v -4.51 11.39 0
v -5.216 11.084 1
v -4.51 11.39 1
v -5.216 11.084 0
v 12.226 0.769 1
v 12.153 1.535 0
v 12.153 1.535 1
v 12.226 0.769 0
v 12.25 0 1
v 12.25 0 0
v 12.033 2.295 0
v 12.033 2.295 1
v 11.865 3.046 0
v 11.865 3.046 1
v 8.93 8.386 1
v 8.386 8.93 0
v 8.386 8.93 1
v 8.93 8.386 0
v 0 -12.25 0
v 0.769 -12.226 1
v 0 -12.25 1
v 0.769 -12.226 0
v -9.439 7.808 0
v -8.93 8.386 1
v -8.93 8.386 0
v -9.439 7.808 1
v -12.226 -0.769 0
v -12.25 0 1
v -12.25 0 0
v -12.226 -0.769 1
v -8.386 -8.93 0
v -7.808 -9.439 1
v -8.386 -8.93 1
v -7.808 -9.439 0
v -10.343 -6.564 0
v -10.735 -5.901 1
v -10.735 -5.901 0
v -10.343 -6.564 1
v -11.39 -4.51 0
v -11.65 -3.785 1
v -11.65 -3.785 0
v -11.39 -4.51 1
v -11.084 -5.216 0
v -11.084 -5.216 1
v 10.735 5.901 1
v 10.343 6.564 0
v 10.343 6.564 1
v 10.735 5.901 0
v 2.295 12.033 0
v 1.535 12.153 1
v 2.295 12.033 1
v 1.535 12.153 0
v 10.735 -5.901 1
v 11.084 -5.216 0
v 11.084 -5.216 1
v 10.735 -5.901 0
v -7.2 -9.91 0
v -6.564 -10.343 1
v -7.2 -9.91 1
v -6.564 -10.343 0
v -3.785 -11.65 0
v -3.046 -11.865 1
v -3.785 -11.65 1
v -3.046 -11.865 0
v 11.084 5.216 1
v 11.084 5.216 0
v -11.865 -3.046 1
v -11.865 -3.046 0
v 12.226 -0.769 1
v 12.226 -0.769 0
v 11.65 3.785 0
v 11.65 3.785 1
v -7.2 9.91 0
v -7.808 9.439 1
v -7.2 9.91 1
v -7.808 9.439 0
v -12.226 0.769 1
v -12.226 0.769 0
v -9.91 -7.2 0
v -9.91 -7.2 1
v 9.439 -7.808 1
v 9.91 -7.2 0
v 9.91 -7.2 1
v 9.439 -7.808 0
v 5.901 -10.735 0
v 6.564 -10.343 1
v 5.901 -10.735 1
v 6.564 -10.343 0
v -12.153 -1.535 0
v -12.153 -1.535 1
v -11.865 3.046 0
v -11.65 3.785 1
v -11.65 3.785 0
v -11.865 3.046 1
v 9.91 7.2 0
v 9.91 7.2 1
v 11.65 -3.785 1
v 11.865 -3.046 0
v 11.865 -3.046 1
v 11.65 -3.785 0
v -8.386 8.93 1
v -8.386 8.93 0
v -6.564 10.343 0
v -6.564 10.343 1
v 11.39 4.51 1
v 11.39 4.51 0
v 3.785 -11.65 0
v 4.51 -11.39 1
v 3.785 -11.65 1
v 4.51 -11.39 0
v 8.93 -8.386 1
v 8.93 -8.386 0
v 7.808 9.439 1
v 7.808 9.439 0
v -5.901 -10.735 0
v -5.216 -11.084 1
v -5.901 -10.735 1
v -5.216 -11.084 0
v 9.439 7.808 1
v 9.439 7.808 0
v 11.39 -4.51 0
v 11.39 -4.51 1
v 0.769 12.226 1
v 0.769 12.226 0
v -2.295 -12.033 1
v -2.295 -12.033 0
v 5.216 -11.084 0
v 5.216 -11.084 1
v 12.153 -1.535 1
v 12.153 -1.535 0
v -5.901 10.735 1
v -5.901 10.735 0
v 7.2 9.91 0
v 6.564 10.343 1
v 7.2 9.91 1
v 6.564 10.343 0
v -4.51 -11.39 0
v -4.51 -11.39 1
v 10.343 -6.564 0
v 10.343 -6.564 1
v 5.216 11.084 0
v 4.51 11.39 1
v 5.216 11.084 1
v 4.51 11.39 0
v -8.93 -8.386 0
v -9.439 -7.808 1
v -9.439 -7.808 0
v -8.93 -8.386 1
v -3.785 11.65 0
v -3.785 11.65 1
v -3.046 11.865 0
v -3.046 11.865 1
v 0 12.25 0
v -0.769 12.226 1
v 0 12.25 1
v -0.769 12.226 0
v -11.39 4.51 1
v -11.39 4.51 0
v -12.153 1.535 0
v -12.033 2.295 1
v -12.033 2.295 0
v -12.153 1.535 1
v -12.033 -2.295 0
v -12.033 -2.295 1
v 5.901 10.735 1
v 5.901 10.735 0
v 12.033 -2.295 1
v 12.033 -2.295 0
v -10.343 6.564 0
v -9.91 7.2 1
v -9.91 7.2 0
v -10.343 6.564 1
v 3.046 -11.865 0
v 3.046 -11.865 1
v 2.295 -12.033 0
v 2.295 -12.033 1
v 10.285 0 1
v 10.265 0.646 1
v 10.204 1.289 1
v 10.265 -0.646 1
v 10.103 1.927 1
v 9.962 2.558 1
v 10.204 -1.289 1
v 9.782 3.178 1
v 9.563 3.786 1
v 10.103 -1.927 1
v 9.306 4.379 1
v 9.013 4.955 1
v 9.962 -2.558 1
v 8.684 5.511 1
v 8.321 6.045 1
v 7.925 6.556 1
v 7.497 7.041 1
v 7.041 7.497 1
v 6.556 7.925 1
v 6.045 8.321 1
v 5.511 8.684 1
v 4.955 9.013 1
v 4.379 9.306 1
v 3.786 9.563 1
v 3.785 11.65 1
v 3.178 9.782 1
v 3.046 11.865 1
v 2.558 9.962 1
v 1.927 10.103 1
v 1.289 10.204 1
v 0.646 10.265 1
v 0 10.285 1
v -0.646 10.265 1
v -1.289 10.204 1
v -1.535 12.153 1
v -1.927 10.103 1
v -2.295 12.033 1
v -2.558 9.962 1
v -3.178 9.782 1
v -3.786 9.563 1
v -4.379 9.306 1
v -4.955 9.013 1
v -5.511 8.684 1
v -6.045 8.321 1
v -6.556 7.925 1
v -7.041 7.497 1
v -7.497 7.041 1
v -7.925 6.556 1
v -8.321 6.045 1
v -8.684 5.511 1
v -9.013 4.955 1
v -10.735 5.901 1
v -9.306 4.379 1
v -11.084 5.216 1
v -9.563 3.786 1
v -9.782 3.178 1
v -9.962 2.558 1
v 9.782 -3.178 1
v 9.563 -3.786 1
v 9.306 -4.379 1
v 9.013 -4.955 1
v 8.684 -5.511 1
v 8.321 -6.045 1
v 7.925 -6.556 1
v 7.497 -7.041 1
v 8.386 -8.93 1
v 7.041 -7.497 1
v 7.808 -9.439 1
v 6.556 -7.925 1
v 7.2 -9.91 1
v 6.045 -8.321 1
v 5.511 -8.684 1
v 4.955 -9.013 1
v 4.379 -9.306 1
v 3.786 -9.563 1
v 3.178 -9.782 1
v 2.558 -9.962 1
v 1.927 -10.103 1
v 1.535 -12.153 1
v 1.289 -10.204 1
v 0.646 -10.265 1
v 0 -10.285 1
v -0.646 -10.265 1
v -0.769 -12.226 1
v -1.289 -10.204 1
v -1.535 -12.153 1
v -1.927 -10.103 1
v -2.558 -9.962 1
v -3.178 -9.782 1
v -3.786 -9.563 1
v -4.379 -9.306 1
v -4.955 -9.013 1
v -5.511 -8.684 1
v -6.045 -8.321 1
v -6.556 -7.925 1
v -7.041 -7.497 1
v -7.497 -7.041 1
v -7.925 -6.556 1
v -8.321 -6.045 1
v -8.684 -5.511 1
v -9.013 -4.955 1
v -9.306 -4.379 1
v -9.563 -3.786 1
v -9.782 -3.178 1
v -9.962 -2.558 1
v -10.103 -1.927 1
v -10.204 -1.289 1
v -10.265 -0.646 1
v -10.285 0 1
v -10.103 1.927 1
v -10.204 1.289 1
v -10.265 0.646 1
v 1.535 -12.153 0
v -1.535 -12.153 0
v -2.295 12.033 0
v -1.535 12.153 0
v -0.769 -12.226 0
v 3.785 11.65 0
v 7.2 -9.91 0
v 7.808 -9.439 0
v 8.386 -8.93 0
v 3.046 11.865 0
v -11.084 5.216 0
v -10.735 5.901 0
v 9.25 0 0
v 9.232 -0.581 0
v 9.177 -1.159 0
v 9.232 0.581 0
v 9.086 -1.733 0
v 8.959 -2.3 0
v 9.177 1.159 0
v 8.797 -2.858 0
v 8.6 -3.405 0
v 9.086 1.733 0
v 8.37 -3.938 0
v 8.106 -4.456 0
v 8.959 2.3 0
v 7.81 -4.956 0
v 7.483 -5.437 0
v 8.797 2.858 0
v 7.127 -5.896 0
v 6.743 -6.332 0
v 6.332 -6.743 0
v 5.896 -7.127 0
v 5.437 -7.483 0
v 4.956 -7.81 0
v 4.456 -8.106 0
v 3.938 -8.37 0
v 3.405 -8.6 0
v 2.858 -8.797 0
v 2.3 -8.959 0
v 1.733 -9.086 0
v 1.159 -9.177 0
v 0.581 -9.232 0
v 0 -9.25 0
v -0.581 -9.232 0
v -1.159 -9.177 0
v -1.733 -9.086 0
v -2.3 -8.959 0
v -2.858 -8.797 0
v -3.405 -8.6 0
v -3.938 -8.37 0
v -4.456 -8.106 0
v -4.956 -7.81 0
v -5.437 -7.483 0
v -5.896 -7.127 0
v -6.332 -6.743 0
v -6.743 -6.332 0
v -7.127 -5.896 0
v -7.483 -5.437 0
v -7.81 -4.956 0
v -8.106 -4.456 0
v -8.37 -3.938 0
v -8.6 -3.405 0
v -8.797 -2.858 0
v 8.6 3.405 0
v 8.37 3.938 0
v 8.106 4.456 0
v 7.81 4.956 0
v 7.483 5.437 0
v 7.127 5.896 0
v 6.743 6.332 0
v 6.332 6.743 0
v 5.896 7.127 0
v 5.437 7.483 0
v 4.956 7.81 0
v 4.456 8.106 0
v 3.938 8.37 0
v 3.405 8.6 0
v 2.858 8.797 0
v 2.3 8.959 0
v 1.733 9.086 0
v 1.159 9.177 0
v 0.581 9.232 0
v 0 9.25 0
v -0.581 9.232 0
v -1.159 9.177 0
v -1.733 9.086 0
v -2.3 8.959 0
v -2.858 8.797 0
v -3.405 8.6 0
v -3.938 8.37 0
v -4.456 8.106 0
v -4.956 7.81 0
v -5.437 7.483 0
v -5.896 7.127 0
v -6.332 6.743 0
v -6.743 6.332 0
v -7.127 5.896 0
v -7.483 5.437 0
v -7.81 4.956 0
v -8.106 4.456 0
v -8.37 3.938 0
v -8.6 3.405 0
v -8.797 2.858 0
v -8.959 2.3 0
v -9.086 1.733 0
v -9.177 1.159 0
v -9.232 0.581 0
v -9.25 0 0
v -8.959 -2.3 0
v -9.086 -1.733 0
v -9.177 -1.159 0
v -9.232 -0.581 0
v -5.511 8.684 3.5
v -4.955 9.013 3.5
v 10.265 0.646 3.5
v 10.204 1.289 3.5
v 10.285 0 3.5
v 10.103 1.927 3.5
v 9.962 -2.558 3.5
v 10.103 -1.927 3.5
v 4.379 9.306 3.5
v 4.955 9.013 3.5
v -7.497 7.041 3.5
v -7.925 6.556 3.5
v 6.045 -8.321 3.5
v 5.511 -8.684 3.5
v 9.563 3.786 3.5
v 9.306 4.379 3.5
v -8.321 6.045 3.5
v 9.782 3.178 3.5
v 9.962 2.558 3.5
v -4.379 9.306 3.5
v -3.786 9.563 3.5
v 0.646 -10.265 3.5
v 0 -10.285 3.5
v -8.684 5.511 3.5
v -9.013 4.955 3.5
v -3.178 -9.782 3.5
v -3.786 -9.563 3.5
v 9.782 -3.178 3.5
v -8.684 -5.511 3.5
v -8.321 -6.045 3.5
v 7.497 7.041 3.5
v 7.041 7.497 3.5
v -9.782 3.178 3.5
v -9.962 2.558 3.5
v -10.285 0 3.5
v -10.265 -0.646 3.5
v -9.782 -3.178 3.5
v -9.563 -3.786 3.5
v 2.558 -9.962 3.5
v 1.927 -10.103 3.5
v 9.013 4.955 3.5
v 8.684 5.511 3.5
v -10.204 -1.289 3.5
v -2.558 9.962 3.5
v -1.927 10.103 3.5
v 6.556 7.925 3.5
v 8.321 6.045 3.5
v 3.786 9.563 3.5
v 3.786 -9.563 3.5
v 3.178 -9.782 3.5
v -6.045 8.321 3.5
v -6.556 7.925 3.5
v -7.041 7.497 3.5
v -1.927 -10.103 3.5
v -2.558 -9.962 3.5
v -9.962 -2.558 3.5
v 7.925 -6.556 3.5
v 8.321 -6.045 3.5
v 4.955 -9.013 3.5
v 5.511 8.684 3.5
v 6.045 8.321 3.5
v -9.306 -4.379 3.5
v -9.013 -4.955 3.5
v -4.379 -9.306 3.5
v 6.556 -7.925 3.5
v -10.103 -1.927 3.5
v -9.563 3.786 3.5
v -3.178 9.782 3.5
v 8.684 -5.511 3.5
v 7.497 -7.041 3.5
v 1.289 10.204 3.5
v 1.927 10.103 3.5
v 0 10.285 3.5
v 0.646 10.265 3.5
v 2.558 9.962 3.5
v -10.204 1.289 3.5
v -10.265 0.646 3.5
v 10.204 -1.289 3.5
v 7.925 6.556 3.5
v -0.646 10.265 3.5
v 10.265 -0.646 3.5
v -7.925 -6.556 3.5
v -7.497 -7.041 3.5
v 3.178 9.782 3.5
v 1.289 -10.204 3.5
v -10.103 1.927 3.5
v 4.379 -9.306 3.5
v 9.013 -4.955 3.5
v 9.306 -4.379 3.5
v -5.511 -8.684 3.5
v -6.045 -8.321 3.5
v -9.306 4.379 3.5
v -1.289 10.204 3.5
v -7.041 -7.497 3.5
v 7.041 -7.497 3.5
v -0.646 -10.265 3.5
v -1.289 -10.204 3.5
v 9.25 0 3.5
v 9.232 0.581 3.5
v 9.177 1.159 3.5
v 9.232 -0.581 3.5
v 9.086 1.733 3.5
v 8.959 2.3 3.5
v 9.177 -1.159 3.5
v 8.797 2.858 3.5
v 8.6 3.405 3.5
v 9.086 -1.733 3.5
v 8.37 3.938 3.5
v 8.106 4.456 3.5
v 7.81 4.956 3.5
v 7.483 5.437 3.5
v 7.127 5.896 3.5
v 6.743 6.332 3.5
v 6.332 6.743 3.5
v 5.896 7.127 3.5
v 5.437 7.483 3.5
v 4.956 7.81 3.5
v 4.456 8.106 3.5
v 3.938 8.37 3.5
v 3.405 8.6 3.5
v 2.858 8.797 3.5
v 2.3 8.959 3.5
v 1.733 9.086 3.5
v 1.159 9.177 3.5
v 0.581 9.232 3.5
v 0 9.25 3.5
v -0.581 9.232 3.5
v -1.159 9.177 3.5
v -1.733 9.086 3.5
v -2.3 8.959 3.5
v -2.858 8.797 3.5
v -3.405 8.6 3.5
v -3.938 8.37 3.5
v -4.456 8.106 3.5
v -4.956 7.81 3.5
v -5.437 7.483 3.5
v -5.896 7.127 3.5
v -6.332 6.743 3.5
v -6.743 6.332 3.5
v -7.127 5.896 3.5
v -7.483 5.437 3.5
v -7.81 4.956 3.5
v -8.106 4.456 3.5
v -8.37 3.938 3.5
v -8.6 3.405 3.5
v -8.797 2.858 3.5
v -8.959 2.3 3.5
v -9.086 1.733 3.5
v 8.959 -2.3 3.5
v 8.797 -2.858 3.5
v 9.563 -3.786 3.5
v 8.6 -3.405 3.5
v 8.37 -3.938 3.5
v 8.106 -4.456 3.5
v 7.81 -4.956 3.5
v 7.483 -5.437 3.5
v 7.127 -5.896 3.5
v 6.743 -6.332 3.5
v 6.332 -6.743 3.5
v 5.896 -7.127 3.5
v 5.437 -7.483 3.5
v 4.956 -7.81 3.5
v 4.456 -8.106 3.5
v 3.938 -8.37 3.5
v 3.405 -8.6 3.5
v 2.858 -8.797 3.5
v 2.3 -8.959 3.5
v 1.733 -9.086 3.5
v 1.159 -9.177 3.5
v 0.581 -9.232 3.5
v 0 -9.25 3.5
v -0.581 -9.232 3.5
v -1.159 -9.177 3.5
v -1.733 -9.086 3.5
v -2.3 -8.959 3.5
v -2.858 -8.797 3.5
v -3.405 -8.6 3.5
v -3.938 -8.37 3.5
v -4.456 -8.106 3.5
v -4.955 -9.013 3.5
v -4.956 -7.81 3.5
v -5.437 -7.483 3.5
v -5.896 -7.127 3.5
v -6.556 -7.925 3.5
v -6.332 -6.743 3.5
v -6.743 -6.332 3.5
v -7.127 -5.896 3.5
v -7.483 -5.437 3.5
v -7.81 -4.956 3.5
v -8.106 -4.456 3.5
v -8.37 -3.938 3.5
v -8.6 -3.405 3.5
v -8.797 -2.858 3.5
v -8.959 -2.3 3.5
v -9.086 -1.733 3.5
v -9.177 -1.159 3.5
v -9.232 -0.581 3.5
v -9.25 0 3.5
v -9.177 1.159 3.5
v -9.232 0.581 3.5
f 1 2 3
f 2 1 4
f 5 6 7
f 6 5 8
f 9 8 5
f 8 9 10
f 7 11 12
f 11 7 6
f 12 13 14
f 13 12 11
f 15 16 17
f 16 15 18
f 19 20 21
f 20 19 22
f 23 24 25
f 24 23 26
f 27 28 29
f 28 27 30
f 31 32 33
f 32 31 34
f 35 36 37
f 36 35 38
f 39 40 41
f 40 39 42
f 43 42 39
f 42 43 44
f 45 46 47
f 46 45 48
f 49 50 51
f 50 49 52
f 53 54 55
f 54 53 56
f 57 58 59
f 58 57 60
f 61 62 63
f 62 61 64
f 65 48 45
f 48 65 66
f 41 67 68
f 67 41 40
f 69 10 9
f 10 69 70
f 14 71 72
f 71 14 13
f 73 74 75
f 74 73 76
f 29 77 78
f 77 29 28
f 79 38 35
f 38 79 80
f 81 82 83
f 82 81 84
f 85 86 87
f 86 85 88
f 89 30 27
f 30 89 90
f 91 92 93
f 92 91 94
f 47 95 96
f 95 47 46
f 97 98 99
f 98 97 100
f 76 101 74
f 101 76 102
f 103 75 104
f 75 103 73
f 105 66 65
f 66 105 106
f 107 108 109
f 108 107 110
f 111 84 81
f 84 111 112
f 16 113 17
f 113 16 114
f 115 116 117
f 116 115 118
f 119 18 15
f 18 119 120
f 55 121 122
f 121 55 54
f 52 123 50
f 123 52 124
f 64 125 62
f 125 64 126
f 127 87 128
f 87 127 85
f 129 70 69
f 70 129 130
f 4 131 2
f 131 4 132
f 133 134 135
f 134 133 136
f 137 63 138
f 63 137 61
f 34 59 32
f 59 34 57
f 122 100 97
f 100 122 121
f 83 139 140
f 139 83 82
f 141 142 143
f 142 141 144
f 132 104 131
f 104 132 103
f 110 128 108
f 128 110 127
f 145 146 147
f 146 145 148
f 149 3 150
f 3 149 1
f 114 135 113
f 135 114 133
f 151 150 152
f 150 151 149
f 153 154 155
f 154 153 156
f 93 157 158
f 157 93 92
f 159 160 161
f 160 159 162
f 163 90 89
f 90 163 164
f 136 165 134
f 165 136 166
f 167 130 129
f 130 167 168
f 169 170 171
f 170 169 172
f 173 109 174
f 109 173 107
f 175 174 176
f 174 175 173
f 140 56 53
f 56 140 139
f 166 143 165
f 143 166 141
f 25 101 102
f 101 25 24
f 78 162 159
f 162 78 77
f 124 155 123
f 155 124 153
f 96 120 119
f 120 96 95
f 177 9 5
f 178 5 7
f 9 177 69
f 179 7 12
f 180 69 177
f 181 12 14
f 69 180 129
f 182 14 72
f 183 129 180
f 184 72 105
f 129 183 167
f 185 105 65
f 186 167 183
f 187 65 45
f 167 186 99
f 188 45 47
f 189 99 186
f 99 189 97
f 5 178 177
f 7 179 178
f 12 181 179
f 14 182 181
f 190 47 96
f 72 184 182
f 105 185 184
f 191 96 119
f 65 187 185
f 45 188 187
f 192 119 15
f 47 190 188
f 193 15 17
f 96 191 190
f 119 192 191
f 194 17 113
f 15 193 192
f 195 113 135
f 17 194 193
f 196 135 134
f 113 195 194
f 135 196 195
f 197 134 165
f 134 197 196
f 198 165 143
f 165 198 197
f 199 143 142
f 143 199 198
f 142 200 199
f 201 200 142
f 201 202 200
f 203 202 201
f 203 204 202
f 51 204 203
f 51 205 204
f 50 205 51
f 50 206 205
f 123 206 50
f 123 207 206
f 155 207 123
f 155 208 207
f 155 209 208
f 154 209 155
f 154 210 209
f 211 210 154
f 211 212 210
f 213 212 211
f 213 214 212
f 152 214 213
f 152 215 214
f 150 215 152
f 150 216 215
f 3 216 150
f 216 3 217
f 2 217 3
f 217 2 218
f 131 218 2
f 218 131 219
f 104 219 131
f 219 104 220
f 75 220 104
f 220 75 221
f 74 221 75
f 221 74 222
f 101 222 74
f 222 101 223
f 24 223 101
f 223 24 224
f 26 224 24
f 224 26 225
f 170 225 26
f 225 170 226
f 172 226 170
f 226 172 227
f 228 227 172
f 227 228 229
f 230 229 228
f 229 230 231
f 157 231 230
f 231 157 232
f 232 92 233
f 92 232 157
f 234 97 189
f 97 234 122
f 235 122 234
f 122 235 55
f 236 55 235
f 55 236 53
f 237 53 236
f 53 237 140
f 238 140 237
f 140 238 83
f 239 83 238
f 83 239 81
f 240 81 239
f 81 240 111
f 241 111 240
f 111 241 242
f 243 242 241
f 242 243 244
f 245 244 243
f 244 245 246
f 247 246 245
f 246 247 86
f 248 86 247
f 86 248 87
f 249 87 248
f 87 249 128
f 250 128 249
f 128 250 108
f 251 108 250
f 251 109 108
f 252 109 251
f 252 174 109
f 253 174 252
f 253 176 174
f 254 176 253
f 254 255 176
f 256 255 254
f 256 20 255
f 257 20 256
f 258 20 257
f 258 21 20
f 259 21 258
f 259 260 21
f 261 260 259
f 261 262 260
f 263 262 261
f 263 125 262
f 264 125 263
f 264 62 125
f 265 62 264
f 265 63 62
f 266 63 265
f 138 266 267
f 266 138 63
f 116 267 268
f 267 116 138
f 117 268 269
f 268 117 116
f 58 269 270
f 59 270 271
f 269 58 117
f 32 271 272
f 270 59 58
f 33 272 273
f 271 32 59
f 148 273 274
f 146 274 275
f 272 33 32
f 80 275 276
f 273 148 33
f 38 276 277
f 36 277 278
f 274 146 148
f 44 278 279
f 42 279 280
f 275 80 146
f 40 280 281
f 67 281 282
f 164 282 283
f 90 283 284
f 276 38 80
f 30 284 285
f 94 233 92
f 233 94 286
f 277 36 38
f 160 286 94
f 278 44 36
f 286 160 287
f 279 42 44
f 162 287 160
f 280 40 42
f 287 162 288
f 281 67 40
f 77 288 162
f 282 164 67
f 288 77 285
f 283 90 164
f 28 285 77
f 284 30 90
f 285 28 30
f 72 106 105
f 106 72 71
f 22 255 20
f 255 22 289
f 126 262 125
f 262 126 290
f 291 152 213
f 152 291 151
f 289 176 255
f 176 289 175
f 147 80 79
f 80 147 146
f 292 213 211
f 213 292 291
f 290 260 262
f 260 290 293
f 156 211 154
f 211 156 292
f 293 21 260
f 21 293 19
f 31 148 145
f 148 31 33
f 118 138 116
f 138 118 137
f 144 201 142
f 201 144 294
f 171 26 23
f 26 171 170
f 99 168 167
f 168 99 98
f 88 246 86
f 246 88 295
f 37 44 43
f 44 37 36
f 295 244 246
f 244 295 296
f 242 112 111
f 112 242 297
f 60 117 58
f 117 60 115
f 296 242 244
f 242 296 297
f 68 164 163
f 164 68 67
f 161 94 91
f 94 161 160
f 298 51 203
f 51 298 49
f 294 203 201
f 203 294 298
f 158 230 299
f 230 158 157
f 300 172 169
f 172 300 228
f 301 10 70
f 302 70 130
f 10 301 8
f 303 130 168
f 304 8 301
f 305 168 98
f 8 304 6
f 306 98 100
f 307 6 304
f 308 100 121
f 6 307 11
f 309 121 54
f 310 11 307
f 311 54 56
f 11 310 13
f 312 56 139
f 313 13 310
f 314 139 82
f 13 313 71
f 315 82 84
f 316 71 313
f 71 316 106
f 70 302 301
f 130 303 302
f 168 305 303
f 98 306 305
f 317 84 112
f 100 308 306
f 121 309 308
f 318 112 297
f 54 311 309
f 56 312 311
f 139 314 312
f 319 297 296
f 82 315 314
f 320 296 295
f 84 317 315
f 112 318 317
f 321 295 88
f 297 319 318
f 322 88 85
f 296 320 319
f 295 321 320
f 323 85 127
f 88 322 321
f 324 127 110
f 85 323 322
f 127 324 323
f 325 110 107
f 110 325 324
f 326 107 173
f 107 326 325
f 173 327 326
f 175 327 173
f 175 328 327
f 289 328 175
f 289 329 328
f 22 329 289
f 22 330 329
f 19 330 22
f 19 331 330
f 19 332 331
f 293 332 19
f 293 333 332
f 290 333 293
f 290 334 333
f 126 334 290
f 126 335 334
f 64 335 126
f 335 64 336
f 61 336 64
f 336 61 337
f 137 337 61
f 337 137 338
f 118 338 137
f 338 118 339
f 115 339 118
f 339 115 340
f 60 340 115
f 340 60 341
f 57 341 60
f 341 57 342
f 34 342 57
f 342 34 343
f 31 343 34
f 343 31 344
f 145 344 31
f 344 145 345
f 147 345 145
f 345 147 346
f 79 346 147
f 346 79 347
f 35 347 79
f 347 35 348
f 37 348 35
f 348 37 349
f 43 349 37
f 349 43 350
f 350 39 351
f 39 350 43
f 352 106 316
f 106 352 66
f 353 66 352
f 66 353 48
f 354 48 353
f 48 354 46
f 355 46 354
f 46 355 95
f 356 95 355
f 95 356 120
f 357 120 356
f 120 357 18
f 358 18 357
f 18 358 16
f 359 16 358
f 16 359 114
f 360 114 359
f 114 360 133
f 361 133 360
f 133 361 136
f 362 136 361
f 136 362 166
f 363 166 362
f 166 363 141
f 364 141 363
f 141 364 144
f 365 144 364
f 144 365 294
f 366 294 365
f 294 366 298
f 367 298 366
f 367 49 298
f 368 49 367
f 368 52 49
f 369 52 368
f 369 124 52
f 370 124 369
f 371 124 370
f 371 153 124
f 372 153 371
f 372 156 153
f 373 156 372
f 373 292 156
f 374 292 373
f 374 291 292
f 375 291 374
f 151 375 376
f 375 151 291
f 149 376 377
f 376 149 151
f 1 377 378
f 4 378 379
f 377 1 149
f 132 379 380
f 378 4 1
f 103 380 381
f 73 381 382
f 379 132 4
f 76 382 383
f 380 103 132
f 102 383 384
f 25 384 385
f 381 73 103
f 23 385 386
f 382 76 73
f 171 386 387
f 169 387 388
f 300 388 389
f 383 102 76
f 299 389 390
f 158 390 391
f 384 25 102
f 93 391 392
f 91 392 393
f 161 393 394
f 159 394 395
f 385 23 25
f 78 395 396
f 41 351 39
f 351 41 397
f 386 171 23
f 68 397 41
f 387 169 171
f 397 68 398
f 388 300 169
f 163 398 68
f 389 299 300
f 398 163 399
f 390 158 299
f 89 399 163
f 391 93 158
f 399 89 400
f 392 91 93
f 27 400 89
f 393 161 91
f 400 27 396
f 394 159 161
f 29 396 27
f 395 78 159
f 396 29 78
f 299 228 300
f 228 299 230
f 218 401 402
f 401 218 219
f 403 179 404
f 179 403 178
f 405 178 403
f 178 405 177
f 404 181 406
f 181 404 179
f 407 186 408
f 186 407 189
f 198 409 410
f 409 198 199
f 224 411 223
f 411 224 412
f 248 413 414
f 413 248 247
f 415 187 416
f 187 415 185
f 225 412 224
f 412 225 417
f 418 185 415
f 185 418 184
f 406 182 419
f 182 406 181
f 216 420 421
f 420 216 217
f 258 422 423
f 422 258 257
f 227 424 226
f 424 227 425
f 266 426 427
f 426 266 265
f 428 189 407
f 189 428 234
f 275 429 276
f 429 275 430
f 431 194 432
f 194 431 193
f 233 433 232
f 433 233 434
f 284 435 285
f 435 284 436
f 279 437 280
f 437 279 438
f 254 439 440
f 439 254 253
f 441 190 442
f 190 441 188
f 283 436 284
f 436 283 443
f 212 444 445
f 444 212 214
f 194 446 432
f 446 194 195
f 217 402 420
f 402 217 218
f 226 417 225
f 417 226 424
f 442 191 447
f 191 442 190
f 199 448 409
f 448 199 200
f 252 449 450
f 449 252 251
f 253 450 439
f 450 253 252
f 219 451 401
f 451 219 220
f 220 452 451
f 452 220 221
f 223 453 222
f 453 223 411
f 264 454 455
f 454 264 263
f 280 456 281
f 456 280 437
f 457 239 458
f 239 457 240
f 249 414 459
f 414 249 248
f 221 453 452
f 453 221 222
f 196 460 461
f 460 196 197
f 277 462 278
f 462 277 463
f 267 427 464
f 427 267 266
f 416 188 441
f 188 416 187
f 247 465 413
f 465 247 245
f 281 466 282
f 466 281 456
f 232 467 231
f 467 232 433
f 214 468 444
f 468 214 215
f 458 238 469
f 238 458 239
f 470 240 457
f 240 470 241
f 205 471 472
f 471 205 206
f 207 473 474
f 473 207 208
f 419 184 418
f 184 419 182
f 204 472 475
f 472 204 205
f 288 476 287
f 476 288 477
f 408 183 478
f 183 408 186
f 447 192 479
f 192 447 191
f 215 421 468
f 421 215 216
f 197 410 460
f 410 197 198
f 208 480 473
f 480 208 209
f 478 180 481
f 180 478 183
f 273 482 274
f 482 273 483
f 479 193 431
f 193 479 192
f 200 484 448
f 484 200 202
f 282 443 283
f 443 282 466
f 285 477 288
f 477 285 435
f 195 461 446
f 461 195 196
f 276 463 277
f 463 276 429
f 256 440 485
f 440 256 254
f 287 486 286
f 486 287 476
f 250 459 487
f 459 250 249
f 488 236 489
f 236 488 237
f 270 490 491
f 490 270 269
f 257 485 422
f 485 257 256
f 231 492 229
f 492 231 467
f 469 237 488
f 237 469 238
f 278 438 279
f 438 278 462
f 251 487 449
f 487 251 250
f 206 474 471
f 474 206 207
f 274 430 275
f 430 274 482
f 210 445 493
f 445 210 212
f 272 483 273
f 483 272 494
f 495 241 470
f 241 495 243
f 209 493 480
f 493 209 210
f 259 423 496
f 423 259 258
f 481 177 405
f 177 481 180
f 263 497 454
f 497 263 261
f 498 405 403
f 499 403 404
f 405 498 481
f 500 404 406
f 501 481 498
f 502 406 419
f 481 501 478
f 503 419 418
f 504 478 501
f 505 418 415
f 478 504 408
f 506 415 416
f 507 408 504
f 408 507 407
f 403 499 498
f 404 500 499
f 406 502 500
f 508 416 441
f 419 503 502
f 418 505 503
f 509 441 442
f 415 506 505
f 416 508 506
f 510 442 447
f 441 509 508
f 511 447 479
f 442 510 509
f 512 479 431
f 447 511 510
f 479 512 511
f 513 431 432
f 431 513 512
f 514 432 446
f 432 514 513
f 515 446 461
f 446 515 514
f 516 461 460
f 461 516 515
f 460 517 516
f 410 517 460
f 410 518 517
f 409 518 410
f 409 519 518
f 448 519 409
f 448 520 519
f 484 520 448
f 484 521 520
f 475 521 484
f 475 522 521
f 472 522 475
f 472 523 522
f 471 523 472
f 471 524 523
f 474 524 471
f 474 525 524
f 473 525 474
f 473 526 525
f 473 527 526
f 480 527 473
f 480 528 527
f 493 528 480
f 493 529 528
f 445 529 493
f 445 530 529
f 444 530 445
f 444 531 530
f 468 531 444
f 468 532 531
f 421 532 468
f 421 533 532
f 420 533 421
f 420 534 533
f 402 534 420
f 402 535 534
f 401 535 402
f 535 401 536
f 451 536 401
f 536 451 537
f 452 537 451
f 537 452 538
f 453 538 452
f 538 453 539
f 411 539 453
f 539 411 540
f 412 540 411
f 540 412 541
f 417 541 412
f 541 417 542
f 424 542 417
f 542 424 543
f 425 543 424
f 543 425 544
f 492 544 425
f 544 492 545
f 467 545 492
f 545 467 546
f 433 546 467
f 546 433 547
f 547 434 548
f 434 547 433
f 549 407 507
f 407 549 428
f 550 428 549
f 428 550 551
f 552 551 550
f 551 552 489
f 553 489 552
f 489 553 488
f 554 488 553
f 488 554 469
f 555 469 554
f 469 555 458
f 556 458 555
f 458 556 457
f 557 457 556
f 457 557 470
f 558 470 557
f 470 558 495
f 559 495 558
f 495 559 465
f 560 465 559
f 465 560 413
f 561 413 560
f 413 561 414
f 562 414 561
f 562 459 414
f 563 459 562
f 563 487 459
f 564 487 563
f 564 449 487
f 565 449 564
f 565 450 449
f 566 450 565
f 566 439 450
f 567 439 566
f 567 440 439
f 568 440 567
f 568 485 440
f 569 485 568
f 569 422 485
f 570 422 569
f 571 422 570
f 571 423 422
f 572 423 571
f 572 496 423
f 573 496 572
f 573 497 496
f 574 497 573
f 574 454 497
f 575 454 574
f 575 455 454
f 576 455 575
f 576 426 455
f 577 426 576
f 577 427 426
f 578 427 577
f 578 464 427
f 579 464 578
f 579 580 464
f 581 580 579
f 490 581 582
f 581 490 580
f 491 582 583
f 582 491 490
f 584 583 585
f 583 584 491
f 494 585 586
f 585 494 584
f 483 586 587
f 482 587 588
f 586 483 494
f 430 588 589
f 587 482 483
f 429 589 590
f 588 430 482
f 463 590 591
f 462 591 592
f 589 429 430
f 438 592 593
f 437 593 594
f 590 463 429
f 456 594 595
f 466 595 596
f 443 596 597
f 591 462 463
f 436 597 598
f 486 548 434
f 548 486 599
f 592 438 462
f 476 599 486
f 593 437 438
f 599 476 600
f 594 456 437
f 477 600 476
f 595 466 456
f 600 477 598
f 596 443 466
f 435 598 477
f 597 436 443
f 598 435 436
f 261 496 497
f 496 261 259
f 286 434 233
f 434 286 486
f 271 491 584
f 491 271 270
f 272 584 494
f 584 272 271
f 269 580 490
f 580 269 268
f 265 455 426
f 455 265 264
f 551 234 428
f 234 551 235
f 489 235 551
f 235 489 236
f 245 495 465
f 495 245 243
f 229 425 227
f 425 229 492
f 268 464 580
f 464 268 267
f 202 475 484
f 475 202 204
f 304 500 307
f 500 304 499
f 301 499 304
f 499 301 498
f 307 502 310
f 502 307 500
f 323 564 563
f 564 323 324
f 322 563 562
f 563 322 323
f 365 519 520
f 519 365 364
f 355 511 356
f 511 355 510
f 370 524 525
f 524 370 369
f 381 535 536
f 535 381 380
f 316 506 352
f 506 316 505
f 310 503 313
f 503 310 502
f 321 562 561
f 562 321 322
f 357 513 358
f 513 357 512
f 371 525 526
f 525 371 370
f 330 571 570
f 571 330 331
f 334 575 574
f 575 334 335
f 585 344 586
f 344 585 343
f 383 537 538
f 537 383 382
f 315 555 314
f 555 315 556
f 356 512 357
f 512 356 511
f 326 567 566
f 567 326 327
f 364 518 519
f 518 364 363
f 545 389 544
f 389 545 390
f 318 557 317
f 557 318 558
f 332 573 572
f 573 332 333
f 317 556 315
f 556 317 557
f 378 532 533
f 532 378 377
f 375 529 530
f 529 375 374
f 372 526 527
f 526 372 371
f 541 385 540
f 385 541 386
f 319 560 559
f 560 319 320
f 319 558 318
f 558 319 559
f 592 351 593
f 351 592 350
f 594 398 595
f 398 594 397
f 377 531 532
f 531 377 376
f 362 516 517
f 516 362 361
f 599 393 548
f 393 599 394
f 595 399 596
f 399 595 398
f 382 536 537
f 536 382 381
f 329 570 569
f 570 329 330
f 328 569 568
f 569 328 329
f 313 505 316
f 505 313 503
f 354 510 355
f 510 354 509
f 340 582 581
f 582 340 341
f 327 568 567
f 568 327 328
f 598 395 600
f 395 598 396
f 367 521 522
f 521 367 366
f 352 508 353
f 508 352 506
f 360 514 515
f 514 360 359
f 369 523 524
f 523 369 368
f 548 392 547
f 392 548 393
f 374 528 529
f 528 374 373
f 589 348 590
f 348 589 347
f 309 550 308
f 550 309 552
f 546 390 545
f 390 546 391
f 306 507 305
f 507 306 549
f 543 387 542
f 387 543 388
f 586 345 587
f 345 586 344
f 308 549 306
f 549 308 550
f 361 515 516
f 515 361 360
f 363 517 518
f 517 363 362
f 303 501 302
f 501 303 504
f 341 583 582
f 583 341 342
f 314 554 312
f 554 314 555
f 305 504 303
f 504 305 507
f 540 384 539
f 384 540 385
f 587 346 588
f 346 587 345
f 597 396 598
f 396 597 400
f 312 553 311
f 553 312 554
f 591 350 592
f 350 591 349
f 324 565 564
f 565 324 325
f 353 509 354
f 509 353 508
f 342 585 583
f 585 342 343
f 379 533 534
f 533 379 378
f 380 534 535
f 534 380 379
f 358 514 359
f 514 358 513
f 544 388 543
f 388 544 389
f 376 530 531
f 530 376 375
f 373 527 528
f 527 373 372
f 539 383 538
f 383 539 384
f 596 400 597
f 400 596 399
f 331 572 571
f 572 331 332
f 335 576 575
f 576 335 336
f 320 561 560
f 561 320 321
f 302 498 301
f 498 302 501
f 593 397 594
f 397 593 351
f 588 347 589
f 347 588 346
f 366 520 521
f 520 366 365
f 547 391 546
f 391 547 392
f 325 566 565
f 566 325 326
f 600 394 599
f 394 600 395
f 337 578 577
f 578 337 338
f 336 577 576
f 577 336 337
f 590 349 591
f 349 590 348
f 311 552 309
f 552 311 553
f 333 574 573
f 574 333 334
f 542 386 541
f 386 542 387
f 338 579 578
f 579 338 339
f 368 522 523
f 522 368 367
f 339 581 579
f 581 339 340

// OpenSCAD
$fn=100;
ts=1;

diametr=[20.57,24.5,18.5];//размер ячейкм
height=3.5;






bas();


module bas(){
    difference(){
        union(){
           translate([0,0,0])cylinder(ts, diametr.y/2, diametr.y/2);
           translate([0,0,0])cylinder(height, diametr.x/2, diametr.x/2); 
        }
         translate([0,0,-0.1])cylinder(height*2, diametr.z/2, diametr.z/2);    
    }
        
}
